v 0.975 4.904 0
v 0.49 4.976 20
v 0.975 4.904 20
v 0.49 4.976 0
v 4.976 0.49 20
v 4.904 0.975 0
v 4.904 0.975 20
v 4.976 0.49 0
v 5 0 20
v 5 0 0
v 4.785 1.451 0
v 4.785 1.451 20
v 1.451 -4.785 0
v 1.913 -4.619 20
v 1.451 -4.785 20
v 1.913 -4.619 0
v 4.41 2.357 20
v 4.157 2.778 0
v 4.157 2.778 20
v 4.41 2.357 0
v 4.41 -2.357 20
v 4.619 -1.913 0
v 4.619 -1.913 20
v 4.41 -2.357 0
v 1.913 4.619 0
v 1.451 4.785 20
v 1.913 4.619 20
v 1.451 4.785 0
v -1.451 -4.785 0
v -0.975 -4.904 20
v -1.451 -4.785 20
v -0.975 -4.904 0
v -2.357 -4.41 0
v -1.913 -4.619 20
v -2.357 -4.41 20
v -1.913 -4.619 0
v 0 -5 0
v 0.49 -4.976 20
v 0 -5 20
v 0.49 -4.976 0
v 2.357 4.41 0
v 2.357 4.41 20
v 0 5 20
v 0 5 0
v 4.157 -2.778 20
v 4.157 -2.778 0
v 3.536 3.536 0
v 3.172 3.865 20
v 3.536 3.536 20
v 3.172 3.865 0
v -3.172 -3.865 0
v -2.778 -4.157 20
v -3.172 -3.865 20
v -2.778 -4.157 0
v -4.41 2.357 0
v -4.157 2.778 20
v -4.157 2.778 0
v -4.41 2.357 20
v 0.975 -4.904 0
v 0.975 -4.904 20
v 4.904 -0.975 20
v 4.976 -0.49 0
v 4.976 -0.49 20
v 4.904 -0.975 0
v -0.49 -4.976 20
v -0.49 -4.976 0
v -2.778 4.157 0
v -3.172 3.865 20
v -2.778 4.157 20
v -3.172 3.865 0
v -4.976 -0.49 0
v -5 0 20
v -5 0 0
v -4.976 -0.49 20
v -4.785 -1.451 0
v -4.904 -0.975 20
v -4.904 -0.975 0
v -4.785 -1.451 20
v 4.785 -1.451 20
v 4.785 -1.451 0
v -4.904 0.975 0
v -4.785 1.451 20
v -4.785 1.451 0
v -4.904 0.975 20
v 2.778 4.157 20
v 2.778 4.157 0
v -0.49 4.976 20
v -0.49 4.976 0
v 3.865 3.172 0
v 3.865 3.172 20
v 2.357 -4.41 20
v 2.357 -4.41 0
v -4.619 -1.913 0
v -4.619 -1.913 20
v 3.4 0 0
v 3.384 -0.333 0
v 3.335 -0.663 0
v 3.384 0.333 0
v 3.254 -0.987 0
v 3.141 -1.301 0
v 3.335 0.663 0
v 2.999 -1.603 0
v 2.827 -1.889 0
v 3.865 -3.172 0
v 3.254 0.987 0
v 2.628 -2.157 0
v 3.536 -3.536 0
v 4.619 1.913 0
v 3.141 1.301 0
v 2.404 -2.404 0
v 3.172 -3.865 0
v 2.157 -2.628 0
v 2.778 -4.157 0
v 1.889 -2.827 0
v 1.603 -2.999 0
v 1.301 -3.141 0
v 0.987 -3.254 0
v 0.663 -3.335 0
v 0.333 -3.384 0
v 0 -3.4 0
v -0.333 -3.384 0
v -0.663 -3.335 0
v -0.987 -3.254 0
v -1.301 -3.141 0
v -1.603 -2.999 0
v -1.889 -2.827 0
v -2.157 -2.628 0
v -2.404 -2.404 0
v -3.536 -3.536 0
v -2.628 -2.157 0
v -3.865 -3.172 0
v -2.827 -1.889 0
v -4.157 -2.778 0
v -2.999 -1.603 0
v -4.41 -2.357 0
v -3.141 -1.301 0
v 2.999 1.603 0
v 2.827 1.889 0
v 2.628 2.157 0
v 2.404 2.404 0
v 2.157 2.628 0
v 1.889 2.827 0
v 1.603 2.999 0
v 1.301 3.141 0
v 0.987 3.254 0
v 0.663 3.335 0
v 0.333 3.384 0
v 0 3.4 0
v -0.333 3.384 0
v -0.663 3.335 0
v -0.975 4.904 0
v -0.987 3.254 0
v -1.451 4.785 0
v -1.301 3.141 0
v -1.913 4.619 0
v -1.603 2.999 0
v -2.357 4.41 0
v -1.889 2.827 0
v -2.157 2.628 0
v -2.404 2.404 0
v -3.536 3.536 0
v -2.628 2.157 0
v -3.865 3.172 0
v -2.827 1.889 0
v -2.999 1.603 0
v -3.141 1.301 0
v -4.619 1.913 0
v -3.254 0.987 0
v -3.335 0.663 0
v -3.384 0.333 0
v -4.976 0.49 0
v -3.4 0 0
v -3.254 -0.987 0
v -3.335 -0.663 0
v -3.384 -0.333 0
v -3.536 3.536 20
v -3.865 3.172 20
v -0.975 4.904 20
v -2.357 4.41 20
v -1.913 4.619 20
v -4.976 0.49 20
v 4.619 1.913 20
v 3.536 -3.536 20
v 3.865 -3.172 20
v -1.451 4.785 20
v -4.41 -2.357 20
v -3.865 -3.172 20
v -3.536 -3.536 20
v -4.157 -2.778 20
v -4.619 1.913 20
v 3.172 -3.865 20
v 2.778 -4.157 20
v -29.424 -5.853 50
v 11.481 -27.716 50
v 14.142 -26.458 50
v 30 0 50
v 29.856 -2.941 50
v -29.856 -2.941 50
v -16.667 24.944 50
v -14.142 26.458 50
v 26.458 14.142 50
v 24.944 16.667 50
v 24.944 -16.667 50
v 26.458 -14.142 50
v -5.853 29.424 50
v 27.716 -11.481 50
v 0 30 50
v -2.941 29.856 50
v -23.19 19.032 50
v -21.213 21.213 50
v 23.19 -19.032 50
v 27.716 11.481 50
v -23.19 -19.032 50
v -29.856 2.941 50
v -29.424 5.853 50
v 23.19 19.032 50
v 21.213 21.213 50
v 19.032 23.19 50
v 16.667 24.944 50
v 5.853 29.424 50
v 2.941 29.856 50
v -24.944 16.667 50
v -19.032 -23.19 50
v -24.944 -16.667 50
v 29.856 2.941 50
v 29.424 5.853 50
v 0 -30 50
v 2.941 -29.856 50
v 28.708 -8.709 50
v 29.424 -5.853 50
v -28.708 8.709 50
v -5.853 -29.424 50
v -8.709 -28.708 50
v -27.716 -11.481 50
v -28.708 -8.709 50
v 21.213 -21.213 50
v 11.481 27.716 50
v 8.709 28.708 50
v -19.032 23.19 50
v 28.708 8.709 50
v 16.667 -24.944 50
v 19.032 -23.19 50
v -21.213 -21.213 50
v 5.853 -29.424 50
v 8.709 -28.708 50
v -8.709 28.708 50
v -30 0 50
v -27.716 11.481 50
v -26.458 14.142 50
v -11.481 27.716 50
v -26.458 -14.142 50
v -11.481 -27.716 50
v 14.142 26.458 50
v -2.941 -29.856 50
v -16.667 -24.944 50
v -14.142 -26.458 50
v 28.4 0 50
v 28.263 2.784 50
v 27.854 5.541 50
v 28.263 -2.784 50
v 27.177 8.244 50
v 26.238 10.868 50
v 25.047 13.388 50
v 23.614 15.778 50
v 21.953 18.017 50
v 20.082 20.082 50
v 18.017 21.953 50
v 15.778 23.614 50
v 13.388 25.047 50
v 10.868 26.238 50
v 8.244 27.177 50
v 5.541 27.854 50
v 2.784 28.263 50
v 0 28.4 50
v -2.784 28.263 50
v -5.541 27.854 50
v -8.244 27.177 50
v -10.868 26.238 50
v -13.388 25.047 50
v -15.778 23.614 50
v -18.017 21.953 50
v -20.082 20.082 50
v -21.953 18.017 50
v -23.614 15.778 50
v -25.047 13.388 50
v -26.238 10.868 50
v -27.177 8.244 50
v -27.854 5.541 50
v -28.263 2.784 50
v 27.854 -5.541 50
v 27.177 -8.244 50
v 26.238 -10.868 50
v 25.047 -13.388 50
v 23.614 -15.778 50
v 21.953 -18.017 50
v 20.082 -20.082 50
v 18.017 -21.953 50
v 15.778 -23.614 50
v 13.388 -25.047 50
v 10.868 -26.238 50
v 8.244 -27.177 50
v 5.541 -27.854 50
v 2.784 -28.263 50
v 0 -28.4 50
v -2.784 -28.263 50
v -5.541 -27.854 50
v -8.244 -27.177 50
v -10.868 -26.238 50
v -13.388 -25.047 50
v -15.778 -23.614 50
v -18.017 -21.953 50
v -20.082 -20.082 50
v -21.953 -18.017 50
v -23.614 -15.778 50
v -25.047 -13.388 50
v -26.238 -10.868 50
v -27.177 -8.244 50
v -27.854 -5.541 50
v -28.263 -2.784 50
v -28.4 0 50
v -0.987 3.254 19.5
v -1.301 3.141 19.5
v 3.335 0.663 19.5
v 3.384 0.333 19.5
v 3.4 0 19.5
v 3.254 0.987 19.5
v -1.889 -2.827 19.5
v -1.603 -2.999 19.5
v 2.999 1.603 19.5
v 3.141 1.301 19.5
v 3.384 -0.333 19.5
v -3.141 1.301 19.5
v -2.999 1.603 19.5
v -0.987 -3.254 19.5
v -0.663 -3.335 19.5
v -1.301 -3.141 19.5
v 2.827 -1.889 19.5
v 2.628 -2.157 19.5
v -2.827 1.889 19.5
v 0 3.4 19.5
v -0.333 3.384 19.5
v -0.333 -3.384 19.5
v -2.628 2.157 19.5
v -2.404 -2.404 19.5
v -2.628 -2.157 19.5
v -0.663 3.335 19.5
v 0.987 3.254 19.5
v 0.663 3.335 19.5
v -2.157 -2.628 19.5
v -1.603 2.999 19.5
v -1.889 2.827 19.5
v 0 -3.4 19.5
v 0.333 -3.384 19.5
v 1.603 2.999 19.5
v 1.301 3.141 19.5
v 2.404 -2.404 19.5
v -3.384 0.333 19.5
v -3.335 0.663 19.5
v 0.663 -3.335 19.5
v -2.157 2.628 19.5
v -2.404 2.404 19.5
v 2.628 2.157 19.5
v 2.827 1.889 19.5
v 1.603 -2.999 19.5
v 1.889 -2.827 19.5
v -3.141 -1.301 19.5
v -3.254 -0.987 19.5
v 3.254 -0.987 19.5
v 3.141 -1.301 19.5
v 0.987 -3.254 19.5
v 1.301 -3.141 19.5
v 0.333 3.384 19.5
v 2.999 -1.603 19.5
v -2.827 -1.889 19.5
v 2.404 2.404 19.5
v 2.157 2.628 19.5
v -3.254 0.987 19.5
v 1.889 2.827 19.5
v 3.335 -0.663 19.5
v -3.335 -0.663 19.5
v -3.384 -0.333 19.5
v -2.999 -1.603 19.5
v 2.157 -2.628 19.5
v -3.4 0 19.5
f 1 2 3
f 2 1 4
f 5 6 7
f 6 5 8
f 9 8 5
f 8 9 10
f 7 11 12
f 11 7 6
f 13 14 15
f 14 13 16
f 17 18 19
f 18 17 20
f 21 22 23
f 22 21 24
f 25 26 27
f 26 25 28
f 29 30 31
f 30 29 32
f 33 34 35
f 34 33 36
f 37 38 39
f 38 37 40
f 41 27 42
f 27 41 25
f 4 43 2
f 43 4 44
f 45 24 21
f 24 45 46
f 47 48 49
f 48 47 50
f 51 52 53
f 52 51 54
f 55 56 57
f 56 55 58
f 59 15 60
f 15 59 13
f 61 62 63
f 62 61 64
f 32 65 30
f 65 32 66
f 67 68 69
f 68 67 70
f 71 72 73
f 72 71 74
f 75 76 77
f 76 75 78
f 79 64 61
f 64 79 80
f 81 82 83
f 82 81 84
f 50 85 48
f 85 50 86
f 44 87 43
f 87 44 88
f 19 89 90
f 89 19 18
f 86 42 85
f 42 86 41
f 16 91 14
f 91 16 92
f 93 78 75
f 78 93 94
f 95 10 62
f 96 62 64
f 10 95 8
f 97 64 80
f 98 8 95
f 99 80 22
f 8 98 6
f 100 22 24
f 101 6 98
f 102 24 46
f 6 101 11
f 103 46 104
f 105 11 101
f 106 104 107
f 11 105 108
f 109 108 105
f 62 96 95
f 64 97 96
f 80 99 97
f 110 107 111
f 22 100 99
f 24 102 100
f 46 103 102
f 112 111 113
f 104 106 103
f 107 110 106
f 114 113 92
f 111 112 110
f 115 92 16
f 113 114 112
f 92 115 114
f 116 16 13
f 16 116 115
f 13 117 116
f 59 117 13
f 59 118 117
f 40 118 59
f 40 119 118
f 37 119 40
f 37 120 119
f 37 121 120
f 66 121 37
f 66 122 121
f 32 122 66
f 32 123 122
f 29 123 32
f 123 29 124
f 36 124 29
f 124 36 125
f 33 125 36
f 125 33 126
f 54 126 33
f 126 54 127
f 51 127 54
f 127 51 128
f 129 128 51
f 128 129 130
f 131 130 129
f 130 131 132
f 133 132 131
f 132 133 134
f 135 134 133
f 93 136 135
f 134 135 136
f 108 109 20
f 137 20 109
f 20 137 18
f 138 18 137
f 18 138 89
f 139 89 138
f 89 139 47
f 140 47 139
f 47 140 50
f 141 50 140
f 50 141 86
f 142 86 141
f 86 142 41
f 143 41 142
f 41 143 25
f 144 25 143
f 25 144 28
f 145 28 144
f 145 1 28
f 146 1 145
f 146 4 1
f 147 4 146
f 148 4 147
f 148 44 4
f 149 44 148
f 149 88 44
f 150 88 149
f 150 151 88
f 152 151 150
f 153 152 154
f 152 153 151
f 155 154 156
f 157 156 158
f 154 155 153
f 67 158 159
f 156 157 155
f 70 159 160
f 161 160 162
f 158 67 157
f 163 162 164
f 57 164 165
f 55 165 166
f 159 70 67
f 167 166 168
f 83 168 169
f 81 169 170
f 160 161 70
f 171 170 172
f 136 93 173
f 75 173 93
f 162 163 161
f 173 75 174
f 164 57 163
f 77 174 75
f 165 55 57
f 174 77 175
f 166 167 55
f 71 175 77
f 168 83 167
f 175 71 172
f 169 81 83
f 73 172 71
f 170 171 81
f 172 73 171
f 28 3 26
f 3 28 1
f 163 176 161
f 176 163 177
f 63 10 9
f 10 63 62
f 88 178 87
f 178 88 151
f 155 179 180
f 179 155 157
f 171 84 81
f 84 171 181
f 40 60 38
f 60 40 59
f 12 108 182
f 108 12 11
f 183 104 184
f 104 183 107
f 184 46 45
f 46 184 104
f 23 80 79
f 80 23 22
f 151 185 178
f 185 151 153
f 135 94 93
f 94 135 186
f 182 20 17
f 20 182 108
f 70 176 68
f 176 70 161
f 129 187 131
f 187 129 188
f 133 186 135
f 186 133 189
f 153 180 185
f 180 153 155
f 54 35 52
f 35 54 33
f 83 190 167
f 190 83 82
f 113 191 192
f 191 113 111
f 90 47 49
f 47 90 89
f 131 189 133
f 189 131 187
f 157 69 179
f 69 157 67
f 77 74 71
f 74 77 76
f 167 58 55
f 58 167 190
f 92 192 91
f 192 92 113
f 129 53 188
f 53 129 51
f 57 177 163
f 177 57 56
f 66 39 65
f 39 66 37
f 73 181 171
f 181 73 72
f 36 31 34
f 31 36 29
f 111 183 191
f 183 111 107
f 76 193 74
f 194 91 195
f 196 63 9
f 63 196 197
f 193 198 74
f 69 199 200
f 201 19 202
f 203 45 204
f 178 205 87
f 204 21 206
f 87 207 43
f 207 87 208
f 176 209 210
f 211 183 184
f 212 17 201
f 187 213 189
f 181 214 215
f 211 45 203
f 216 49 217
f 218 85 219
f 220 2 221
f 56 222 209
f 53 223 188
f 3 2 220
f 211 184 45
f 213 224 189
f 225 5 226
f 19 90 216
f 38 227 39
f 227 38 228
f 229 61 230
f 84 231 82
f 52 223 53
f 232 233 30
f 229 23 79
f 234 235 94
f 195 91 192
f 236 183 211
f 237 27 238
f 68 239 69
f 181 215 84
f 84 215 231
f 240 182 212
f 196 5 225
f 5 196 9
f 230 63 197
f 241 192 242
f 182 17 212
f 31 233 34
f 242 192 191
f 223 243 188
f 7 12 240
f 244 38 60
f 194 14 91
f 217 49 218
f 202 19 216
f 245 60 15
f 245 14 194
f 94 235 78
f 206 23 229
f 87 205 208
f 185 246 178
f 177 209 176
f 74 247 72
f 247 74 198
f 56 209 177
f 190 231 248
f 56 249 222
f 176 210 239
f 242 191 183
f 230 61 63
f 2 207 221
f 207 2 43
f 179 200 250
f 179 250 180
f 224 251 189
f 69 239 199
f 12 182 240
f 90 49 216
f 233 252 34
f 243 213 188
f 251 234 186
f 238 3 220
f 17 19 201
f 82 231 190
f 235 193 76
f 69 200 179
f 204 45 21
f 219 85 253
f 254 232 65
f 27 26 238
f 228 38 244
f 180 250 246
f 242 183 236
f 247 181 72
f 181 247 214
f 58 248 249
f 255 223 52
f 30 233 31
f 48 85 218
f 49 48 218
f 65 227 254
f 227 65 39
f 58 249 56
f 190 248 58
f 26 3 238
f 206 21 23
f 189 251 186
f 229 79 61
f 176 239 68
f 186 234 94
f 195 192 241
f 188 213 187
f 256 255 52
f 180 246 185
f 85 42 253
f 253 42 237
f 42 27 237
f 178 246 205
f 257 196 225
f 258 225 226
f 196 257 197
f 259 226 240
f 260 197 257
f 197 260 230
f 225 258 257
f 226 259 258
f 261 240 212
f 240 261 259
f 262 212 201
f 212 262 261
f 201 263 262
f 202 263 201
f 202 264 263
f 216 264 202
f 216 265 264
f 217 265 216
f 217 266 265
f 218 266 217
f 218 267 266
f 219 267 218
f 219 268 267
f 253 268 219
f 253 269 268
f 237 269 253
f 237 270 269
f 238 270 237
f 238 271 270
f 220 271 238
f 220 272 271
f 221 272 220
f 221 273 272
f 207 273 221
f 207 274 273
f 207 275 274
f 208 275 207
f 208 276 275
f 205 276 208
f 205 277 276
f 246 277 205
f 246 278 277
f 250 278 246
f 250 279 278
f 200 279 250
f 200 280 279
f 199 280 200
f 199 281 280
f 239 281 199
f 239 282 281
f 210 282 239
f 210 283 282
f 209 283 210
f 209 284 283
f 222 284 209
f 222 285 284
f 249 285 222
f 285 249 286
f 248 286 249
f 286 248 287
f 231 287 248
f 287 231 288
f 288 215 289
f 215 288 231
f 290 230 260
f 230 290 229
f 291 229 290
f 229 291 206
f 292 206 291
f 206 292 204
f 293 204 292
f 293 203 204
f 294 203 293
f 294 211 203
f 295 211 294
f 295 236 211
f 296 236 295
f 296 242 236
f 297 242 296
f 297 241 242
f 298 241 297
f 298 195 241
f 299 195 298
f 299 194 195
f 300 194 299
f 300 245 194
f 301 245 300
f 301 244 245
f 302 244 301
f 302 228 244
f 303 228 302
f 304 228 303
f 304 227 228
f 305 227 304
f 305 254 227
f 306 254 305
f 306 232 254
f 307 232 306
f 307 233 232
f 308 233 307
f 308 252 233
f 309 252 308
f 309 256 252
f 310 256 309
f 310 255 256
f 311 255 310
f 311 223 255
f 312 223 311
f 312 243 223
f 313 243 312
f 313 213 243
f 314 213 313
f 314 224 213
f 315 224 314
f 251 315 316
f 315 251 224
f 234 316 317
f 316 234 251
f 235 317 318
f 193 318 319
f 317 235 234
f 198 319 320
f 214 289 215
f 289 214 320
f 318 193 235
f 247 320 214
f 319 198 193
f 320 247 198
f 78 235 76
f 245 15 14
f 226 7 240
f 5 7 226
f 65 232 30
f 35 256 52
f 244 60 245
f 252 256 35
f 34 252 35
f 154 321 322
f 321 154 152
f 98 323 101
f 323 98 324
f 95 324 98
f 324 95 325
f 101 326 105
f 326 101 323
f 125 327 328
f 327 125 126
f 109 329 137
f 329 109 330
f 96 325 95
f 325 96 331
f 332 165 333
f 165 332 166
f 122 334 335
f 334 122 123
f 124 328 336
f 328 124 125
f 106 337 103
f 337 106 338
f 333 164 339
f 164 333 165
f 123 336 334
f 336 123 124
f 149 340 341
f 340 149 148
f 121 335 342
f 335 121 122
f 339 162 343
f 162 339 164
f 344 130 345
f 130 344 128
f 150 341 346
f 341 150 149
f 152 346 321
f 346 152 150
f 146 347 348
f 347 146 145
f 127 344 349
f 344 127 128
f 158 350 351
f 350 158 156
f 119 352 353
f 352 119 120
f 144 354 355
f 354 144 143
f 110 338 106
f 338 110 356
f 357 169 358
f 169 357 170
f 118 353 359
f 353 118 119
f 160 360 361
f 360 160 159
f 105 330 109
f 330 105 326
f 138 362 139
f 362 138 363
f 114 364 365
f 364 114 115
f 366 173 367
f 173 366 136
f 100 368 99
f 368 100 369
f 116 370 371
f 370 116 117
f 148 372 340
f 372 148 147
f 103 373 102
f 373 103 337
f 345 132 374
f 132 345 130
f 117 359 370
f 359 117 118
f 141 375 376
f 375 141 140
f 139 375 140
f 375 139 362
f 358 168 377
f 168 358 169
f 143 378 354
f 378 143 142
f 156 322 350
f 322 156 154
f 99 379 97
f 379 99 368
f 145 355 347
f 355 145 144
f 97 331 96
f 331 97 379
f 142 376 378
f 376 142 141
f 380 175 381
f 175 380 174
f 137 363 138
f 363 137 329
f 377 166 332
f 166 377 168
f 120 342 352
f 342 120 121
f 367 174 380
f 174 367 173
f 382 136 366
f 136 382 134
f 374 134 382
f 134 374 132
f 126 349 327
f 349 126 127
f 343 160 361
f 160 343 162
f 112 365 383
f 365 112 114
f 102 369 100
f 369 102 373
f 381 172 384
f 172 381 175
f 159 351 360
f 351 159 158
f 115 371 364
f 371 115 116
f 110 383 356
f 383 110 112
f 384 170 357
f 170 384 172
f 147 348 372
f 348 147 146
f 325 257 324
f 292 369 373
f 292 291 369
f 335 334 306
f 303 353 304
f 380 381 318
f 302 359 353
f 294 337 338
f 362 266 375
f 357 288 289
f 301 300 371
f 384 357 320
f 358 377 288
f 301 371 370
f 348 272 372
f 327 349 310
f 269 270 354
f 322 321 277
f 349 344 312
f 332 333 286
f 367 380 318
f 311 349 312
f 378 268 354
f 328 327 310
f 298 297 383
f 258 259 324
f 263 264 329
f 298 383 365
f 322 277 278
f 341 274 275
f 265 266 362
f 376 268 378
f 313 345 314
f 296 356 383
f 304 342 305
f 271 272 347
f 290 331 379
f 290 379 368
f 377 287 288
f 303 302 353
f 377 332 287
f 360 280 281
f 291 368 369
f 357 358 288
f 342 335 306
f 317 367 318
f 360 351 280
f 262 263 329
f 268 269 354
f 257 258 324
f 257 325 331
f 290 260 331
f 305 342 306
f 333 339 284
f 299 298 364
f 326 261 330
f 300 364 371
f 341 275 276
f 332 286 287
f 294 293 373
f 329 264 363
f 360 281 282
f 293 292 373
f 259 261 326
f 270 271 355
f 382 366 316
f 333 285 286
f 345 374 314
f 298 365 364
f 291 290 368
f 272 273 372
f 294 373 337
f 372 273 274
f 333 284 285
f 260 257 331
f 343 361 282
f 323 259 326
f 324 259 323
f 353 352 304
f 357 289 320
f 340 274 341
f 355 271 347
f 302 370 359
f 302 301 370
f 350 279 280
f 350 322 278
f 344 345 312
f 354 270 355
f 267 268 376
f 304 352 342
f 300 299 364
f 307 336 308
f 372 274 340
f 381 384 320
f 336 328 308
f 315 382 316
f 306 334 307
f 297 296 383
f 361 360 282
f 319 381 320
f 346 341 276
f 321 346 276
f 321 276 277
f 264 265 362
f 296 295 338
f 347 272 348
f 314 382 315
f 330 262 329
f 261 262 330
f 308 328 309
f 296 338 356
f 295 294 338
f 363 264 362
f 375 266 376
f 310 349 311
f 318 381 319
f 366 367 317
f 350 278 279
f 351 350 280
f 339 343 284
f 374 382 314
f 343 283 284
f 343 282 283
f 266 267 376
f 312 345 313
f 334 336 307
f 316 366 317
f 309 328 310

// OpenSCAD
// Lab funnel - printed upright, open at top and bottom
// Units: mm

$fn = 64;

// --- Dimensions ---
spout_od      = 10;    // spout outer diameter
spout_length  = 20;    // spout runs from z = 0 to z = 20
cone_top_d    = 60;    // cone outer diameter at rim (z = 50)
cone_bottom_d = 10;    // cone outer diameter at base (z = 20)
wall          = 1.6;   // wall thickness everywhere
cut_extra     = 0.5;   // overshoot for clean cuts

// Derived
spout_id = spout_od - 2 * wall;   // bore diameter (6.8 mm)
rim_d    = cone_top_d;
base_d   = cone_bottom_d;
cone_h   = 50 - 20;               // cone height

difference() {
    union() {
        // Straight spout
        cylinder(d = spout_od, h = spout_length);
        // Cone from z = 20 to z = 50
        translate([0, 0, 20])
            cylinder(d1 = base_d, d2 = rim_d, h = cone_h);
    }
    // Through-bore: spout + extended cone section
    translate([0, 0, -cut_extra])
        cylinder(d = spout_id, h = spout_length + 2 * cut_extra);
    translate([0, 0, 20 - cut_extra])
        cylinder(d1 = base_d - 2 * wall,
                 d2 = rim_d - 2 * wall,
                 h = cone_h + cut_extra);
}
